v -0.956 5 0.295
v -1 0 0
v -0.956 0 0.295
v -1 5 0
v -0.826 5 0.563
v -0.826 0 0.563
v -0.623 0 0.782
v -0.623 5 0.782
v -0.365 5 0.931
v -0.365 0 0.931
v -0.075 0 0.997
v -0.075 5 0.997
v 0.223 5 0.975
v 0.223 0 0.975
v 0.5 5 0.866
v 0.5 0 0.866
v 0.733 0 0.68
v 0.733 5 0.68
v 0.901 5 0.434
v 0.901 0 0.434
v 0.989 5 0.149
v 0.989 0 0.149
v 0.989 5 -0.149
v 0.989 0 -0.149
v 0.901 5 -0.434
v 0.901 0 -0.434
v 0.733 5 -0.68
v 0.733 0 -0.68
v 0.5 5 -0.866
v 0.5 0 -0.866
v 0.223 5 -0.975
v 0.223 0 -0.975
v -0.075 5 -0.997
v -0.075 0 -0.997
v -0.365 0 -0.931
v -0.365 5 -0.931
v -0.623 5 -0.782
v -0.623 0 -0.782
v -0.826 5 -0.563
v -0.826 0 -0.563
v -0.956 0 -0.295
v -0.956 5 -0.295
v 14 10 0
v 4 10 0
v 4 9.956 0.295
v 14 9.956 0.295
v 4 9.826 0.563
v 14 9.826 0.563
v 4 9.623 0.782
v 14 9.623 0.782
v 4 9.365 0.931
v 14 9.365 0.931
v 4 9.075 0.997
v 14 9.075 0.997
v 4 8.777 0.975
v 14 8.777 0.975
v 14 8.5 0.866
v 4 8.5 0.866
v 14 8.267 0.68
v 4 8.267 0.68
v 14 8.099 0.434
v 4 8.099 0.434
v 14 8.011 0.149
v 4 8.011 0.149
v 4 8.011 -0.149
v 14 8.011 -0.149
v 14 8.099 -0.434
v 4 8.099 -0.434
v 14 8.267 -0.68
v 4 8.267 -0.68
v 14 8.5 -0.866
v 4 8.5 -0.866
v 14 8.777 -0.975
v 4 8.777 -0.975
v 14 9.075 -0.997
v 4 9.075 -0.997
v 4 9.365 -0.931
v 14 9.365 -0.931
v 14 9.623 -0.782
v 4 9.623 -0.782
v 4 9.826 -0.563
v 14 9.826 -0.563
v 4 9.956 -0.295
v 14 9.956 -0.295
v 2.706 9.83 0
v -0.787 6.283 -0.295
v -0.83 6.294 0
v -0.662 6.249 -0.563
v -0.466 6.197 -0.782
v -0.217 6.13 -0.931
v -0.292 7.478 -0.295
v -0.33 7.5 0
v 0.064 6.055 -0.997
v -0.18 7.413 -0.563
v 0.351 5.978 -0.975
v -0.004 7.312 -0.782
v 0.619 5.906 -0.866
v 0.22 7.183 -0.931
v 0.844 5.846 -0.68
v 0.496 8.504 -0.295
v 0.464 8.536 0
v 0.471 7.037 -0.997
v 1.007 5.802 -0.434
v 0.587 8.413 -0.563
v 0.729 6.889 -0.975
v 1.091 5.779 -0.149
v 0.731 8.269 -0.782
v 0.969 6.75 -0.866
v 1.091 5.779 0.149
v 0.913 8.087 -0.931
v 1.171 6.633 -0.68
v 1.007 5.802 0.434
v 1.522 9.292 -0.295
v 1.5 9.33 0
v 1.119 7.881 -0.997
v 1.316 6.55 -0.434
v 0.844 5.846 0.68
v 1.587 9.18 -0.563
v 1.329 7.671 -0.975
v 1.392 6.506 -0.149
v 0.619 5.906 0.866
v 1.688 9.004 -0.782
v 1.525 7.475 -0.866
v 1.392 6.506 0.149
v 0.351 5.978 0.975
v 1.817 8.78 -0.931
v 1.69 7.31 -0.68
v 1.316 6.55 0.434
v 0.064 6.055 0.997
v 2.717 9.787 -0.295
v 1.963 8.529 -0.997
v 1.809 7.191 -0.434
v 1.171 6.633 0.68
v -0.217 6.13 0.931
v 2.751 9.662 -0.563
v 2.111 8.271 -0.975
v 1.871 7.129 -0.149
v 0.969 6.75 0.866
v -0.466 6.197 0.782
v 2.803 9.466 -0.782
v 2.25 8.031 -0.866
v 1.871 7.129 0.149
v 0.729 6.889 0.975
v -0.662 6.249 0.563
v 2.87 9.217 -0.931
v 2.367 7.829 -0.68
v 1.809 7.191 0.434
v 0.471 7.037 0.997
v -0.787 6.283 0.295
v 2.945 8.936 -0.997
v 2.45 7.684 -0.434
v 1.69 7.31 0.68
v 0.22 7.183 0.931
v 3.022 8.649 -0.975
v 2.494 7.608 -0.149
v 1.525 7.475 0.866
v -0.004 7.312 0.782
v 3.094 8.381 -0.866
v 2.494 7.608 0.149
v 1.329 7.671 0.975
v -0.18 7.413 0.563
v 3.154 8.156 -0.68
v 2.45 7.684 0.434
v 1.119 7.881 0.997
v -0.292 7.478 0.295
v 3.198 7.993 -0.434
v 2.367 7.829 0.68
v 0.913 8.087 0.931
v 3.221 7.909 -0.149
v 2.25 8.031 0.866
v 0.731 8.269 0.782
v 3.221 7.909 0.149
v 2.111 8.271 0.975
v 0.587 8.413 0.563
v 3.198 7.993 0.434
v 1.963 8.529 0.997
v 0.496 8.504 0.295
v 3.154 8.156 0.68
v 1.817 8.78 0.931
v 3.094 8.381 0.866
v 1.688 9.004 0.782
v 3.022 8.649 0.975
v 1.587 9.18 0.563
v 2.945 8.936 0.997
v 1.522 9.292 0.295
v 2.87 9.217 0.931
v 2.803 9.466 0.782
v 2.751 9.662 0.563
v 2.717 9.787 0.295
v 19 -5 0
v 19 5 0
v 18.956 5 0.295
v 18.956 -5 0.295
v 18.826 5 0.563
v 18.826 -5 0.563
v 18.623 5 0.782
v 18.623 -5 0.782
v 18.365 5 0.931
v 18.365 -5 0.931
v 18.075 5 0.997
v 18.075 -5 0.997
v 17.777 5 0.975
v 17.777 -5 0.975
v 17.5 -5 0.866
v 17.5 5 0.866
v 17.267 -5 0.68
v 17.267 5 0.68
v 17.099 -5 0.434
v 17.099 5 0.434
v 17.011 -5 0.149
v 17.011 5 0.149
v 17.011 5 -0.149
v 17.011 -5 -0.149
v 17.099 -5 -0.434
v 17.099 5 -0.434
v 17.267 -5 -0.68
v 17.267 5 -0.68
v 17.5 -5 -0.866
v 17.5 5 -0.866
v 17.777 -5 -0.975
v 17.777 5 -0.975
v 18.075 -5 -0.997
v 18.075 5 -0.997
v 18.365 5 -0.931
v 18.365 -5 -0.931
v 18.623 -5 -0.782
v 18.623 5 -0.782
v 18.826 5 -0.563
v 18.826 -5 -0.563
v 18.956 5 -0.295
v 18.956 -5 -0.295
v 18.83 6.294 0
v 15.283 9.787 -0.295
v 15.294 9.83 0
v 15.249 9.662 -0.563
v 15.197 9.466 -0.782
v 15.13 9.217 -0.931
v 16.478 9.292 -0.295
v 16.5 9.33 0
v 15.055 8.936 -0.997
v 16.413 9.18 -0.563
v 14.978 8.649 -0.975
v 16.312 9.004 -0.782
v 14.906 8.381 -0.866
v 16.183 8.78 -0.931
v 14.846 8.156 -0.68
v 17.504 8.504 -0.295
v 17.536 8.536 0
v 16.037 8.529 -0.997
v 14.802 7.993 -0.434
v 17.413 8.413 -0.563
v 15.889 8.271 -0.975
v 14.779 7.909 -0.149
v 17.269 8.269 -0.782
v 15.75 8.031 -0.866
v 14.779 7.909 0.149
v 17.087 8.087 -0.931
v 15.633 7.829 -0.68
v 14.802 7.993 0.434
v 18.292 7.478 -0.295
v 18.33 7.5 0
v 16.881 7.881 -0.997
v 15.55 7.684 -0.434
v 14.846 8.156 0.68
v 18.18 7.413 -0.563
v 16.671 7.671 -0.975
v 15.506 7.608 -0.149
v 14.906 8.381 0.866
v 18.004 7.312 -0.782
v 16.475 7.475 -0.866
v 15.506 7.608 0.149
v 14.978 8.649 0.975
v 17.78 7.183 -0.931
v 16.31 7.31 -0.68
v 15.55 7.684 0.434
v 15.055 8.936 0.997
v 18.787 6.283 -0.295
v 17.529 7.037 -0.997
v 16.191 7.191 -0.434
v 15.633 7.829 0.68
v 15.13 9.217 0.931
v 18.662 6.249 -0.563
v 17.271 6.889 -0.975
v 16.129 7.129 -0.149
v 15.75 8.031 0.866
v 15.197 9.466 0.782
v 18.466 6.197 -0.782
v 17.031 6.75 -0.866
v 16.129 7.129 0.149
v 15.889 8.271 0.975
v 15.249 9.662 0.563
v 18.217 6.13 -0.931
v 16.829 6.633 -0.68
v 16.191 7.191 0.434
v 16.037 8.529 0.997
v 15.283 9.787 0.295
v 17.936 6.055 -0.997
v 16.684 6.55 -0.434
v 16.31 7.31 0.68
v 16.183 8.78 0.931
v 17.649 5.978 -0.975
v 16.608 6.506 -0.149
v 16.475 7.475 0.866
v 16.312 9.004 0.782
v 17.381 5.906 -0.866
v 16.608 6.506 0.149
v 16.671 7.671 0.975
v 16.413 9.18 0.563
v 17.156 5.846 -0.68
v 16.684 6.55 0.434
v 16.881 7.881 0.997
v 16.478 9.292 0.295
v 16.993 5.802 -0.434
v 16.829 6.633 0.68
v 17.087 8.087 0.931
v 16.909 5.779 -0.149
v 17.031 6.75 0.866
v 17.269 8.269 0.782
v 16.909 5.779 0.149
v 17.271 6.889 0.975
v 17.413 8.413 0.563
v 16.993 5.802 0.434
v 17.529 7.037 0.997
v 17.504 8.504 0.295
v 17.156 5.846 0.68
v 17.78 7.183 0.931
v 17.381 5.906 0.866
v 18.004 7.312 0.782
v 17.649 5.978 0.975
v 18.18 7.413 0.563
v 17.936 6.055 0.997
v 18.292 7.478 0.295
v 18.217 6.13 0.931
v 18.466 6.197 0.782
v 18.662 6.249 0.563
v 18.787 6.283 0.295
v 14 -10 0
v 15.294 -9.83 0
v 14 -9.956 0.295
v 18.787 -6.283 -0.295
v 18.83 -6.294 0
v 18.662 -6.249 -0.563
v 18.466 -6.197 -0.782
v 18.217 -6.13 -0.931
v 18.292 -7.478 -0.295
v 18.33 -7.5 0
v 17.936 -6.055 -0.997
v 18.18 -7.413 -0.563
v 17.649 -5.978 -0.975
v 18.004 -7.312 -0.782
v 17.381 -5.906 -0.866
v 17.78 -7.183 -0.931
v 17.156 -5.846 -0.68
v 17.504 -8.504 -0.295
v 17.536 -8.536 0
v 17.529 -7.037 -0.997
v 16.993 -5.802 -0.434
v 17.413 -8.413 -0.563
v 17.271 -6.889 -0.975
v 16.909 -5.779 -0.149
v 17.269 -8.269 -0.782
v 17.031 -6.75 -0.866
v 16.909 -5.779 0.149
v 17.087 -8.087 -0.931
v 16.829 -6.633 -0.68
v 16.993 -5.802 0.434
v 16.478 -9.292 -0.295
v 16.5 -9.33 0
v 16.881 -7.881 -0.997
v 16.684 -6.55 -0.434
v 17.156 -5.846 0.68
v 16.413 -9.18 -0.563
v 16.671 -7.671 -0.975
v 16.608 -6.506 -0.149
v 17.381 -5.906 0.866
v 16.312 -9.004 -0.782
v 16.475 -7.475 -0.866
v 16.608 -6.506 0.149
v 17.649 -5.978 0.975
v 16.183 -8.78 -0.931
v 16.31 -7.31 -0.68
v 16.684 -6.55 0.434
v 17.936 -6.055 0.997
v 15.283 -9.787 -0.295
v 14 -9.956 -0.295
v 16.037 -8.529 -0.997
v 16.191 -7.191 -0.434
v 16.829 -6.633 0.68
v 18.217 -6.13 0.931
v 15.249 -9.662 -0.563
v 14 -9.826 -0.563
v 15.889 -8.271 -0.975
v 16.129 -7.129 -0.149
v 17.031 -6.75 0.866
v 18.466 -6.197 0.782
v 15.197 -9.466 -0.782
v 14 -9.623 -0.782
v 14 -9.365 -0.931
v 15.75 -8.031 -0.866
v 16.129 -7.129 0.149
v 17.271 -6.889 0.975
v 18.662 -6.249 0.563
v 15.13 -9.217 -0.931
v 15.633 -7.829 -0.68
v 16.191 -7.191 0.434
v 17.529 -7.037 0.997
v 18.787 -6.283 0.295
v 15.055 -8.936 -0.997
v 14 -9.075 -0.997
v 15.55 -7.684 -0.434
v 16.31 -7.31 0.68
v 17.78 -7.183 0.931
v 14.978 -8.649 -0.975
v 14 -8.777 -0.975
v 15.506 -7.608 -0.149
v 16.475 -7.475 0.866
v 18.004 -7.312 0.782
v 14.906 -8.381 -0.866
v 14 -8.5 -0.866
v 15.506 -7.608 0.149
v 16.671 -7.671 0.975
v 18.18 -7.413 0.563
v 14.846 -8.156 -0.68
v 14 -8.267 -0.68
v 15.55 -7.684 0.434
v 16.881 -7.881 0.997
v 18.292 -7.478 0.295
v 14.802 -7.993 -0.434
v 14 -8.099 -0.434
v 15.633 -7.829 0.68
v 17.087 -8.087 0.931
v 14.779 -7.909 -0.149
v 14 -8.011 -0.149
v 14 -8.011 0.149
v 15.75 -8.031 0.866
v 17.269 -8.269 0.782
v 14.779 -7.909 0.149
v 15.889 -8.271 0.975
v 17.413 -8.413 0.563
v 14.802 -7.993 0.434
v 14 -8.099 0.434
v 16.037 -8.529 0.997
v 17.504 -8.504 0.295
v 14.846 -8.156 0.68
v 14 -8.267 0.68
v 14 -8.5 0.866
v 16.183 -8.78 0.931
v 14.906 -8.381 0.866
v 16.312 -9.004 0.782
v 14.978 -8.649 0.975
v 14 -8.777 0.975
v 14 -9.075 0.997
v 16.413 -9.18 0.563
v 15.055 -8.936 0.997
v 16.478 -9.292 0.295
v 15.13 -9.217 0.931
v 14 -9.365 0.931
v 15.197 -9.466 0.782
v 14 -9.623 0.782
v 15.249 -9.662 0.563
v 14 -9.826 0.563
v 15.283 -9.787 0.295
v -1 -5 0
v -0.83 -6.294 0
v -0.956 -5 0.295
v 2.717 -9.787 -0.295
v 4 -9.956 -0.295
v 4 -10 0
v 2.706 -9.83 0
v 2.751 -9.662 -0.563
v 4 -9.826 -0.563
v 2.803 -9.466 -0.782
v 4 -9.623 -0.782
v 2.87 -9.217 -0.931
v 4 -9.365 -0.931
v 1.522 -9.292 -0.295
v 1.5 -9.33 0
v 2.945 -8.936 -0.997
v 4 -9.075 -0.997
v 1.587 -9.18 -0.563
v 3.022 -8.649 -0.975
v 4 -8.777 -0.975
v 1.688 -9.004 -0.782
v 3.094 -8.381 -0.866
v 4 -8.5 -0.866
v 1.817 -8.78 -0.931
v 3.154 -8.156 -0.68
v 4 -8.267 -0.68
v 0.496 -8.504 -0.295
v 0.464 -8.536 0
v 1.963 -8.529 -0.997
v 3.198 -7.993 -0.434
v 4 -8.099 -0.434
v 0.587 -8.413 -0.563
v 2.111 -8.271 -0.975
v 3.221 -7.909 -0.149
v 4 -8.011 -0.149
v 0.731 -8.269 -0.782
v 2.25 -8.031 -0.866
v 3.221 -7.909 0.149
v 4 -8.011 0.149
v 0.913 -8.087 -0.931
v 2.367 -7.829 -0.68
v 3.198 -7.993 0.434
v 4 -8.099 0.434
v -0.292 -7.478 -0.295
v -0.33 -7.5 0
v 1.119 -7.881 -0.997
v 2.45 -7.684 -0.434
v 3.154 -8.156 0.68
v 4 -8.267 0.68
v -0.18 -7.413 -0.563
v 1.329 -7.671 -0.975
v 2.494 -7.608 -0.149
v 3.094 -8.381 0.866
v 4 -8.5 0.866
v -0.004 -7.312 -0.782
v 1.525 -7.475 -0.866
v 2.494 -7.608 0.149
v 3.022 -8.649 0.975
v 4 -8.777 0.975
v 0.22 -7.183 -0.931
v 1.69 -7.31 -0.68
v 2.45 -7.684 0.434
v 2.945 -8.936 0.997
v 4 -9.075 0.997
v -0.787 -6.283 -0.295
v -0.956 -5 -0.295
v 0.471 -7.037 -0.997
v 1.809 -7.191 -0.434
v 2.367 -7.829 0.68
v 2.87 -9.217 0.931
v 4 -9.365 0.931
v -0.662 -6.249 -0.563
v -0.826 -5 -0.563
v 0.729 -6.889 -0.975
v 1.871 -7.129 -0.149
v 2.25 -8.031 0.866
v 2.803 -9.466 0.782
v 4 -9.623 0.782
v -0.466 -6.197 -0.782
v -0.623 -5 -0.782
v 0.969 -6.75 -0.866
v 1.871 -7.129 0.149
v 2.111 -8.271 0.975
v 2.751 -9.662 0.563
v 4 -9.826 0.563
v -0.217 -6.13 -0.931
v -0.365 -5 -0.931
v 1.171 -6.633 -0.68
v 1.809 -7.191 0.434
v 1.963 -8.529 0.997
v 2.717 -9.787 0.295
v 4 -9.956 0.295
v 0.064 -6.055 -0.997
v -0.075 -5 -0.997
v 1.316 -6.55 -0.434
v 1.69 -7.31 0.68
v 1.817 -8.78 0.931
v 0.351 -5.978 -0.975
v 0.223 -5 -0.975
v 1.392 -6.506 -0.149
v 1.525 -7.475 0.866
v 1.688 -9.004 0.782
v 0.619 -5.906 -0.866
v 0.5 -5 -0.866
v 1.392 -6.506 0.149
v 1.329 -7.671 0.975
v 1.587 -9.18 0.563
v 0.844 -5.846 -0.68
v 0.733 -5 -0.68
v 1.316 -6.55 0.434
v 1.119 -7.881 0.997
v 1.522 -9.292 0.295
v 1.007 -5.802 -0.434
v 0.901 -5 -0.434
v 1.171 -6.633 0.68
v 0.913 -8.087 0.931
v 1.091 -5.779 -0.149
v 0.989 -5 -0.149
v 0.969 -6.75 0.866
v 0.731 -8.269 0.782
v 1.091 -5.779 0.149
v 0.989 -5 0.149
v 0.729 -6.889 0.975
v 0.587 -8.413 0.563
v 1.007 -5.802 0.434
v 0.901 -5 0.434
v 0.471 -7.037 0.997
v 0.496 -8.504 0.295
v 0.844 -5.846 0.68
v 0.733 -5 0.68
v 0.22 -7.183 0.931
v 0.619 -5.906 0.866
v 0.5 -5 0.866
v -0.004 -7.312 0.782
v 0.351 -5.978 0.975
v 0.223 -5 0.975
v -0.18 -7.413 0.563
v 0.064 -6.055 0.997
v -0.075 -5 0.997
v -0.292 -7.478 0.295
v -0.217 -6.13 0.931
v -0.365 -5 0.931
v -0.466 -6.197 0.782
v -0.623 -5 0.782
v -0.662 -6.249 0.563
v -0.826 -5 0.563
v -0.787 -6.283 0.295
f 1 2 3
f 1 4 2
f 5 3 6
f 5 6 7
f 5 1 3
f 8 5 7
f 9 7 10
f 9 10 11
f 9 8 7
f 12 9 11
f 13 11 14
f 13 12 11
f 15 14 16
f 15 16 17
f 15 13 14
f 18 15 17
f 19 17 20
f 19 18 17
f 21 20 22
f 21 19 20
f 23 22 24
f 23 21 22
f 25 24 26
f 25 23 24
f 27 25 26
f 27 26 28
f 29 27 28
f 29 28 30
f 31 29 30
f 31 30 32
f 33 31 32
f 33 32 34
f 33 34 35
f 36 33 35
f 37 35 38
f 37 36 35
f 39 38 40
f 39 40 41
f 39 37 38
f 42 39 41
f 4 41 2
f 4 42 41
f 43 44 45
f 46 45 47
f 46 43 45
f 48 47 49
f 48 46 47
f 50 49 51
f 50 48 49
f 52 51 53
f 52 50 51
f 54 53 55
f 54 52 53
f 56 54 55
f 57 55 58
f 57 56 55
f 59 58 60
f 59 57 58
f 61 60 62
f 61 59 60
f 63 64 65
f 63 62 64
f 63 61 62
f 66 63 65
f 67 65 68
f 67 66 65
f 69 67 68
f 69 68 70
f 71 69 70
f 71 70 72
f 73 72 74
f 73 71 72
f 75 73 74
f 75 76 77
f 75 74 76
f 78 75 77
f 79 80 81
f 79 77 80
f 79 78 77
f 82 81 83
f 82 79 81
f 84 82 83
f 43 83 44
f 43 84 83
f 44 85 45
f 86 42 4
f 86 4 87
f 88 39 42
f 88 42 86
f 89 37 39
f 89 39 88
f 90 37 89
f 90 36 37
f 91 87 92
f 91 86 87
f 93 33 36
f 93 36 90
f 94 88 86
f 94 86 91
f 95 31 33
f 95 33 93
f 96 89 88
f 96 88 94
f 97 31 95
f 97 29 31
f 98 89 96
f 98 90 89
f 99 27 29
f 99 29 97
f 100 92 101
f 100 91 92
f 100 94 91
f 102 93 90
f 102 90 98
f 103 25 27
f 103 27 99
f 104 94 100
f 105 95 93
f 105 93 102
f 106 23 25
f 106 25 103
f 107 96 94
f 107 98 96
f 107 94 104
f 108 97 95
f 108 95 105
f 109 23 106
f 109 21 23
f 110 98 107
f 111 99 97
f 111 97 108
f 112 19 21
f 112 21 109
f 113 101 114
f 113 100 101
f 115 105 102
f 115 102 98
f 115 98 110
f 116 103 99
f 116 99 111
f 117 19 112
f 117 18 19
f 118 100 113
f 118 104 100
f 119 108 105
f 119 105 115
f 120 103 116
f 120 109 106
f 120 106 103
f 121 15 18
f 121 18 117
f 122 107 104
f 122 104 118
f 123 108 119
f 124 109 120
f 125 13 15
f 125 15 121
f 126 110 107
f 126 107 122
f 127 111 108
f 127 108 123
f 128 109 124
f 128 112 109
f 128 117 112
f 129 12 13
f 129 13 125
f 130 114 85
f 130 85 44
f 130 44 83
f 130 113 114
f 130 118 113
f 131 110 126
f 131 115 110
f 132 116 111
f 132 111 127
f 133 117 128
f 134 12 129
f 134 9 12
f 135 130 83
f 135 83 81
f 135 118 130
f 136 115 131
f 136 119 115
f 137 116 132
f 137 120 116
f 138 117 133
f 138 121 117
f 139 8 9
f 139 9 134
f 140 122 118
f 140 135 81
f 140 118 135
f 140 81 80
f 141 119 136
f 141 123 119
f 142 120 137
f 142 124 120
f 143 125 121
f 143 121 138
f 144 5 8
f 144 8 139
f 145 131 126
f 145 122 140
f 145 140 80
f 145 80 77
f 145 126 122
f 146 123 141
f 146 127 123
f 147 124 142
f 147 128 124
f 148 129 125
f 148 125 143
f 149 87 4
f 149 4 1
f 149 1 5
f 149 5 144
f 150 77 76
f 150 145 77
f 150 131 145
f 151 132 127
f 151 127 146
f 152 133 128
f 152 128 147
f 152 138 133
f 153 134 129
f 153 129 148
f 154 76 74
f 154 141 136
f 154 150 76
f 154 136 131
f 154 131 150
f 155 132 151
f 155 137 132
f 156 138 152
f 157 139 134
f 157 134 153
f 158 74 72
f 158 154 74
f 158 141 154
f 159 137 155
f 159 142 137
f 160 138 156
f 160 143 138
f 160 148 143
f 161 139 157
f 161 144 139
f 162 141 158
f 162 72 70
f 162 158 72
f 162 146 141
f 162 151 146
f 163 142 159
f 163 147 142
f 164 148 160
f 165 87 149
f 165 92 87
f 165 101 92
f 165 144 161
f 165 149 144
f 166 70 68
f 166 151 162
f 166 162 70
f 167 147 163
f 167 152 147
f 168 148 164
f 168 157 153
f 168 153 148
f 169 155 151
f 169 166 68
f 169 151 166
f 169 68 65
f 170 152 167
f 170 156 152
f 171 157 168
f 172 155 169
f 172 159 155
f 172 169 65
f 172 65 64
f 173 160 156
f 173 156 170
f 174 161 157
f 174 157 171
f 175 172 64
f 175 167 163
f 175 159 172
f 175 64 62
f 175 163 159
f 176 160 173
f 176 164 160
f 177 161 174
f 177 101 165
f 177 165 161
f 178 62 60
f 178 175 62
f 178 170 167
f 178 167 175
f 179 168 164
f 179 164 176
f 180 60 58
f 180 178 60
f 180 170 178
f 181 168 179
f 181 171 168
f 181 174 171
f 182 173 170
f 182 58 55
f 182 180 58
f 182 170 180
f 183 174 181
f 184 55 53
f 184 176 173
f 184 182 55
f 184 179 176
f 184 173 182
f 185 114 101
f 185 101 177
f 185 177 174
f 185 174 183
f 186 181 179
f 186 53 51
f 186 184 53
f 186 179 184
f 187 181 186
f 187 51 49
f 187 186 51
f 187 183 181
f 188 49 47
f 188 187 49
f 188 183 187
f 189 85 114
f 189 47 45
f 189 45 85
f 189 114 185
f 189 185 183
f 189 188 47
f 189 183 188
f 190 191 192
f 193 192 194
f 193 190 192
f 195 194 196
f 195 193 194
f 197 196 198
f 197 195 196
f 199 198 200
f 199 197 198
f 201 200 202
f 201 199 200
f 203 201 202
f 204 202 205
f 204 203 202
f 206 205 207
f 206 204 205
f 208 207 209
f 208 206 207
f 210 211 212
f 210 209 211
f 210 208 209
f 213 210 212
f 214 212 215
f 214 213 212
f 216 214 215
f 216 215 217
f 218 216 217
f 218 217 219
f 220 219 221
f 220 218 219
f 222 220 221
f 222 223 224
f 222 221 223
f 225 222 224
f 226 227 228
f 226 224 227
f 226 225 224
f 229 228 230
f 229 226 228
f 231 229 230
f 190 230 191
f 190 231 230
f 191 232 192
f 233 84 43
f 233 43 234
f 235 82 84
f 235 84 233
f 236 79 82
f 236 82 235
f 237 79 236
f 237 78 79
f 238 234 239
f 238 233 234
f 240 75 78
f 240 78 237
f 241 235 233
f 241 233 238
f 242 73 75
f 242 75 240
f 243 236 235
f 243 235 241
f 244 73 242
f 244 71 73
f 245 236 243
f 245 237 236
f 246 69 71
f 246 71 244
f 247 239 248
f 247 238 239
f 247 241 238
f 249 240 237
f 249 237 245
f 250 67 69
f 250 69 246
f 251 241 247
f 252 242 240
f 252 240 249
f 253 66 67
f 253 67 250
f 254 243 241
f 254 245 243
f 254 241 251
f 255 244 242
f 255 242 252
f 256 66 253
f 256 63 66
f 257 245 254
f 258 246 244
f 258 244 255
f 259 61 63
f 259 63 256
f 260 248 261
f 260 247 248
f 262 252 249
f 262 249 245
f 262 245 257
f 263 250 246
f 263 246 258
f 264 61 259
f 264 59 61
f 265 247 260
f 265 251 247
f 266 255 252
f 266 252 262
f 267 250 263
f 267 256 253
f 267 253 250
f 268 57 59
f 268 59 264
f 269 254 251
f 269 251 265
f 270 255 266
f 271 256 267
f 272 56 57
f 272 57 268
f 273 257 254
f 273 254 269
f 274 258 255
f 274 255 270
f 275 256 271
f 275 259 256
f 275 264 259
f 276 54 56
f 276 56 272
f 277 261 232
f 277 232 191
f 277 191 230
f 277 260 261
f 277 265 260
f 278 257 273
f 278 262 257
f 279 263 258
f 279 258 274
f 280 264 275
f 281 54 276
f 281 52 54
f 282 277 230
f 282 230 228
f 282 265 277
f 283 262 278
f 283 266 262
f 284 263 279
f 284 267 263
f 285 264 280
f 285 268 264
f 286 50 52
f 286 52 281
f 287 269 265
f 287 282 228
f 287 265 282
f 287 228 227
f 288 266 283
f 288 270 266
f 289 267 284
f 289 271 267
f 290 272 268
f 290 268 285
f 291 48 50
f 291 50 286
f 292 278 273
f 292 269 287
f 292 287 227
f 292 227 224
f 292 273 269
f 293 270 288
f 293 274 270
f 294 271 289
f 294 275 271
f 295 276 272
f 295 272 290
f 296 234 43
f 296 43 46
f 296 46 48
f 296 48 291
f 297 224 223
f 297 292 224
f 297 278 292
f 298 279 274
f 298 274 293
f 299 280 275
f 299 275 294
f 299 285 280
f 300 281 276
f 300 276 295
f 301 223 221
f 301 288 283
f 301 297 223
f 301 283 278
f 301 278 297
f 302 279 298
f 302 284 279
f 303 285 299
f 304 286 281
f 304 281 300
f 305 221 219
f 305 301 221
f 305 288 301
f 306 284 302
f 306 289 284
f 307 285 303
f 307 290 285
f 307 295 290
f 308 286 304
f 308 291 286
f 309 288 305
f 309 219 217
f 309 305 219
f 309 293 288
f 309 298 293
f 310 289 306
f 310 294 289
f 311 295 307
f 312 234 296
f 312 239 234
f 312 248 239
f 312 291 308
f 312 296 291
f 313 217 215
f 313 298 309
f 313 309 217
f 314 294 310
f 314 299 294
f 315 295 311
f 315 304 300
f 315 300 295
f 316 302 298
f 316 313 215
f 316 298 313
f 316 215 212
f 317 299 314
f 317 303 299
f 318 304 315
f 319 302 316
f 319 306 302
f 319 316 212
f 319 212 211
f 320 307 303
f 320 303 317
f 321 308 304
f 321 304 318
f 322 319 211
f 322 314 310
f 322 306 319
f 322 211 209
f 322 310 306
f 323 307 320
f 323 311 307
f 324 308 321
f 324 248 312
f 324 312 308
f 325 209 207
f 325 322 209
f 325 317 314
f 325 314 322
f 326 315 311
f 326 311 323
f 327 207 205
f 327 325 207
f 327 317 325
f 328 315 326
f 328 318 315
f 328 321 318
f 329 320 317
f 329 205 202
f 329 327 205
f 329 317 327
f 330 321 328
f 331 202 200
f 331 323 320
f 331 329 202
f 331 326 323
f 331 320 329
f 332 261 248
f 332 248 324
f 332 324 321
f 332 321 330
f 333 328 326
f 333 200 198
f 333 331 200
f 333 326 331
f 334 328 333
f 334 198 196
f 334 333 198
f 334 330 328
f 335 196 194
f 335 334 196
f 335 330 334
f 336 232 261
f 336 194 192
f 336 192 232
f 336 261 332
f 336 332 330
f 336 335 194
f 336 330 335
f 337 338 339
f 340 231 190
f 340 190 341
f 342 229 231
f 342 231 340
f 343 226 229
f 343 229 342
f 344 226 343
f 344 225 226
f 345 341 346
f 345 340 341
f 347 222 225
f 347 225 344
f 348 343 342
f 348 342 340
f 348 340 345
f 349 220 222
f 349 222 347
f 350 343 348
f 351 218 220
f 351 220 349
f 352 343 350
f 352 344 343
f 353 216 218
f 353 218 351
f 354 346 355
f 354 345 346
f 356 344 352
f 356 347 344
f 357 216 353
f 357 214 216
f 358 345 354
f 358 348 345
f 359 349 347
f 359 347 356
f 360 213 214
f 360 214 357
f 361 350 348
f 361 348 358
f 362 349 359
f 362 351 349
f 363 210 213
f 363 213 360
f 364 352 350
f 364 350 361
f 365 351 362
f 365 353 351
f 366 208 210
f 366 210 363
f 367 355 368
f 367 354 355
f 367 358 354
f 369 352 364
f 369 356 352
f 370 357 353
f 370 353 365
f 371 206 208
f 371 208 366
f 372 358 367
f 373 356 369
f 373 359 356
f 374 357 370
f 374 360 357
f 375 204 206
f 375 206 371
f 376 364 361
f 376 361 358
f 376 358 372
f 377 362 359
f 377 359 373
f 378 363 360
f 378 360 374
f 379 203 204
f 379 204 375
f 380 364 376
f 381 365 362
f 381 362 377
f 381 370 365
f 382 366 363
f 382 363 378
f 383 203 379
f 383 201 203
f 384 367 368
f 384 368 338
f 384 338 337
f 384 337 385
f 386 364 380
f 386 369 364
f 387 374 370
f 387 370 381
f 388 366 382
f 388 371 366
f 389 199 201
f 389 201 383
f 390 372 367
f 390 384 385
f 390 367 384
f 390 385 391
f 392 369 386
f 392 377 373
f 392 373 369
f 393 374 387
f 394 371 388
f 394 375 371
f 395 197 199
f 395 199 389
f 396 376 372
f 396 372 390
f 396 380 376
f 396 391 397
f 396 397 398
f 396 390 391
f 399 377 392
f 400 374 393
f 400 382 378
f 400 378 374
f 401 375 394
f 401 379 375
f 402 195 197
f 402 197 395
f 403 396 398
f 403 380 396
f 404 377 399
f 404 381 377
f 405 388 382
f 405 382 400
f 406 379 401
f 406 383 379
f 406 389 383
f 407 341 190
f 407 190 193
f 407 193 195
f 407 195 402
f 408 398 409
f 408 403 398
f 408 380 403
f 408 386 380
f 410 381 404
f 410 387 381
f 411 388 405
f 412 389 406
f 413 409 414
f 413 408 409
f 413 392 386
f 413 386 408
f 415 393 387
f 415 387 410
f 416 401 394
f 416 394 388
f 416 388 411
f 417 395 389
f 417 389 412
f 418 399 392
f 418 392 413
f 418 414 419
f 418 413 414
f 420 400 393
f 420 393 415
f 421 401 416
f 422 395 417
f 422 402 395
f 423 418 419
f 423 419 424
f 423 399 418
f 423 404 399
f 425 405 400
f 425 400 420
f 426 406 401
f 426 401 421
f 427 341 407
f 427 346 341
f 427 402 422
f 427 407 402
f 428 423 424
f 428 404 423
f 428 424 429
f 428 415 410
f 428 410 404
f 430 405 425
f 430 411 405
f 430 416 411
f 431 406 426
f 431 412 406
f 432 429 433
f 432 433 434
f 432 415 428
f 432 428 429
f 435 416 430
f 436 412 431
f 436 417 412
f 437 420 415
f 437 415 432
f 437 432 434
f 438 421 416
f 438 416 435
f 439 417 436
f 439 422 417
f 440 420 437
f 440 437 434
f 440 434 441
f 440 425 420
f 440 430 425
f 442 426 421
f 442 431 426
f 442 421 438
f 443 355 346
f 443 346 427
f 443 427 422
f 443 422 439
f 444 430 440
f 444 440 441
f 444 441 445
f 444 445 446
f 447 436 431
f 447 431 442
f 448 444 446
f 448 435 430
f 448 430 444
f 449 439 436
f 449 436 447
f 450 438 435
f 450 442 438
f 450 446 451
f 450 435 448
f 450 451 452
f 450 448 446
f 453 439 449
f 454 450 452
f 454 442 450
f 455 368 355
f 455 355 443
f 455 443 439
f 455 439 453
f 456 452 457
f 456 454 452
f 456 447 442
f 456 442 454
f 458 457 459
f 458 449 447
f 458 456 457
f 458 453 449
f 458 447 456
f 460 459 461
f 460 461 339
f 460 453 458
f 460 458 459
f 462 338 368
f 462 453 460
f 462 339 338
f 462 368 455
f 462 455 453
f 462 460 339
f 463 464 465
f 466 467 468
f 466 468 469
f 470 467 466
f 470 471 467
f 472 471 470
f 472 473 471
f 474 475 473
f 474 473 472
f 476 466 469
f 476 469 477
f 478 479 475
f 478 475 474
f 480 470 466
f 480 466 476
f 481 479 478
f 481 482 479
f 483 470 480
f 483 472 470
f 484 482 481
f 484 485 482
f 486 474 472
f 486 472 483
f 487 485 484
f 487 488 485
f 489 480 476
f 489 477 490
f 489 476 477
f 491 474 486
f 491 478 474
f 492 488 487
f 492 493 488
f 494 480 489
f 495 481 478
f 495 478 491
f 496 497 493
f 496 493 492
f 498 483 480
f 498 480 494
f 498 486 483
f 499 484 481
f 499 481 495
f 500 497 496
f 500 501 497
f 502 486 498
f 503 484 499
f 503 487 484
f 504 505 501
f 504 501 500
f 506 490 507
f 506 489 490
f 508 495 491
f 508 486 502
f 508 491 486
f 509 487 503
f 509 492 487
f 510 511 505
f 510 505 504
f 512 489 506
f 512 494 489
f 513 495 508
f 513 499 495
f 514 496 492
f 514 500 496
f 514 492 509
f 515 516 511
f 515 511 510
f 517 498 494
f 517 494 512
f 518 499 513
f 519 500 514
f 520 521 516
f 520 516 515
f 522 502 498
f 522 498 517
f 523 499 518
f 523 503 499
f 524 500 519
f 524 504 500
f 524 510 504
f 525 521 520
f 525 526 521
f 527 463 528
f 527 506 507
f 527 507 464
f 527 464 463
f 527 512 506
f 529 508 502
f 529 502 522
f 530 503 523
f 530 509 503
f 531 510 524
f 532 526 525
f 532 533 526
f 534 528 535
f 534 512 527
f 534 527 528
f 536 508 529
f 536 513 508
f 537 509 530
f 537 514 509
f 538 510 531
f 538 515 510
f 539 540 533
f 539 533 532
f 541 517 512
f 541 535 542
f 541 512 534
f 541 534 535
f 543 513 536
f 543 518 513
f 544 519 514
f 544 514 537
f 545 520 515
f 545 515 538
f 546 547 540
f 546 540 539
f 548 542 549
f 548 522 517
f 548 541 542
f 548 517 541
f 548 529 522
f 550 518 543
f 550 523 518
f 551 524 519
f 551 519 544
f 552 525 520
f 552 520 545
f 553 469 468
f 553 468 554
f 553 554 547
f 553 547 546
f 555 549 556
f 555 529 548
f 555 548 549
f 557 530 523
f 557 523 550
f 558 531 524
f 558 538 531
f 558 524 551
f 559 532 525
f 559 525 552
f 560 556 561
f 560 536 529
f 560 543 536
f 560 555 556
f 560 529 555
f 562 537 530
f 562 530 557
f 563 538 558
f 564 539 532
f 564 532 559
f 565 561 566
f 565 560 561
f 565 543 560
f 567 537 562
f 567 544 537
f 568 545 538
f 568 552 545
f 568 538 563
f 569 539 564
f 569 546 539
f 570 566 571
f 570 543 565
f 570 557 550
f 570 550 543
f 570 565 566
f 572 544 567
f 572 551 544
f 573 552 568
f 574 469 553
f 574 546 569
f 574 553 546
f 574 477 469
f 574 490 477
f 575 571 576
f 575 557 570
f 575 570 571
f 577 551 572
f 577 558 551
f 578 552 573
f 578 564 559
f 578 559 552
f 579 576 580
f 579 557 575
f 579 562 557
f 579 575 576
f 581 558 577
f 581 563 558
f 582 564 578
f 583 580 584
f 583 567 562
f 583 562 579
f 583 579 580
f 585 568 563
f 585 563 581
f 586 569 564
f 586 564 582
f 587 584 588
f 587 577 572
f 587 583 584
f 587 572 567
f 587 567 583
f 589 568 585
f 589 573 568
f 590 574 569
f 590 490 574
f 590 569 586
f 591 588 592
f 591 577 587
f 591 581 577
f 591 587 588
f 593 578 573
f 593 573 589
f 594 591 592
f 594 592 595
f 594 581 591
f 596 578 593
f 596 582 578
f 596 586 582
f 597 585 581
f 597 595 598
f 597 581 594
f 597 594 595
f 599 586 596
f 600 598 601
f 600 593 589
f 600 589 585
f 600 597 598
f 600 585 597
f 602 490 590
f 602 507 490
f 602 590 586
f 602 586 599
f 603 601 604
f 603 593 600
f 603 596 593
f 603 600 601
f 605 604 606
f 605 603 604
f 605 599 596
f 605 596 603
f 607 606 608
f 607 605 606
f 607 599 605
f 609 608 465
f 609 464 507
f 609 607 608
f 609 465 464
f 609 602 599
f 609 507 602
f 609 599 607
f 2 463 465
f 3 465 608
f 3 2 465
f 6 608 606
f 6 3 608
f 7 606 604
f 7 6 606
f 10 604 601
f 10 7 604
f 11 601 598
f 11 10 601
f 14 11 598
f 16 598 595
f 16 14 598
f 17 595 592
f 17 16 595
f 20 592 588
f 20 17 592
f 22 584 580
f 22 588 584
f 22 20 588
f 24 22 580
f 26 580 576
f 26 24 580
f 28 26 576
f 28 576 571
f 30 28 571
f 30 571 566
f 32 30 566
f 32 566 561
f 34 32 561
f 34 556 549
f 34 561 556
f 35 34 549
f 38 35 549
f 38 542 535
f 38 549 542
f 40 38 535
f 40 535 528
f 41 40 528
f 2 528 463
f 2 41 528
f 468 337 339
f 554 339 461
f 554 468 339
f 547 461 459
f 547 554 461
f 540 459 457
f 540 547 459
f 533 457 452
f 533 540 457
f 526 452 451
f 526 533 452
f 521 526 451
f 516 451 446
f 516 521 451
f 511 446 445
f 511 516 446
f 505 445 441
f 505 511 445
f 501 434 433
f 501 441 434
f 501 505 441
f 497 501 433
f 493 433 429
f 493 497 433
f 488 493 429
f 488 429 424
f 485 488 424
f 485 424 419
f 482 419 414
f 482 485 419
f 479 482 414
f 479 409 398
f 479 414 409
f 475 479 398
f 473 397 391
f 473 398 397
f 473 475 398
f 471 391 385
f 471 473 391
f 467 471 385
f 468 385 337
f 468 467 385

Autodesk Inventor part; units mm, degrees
ref_plane "YZ Plane" through (0, 0, 0) normal (1, 0, 0) x (0, 1, 0)
ref_plane "XZ Plane" through (0, 0, 0) normal (0, 1, 0) x (-1, 0, 0)
ref_plane "XY Plane" through (0, 0, 0) normal (0, 0, 1) x (1, 0, 0)
sketch "Эскиз1" plane through (0, 0, 0) normal (0, 1, 0) x (-1, 0, 0)
  circle A0 centre (0, 0) radius 1
  dimension "d0" = 2
sketch "Эскиз2" plane through (0, 0, 0) normal (0, 0, 1) x (1, 0, 0)
  line L0 (0, 0) -> (0, 5)
  line L1 (4, 9) -> (14, 9)
  line L2 (18, 5) -> (18, -5)
  line L3 (14, -9) -> (4, -9)
  line L4 (0, -5) -> (0, 0)
  arc A0 (4, 9) -> (0, 5) centre (4, 5) ccw
  arc A1 (18, 5) -> (14, 9) centre (14, 5) ccw
  arc A2 (14, -9) -> (18, -5) centre (14, -5) ccw
  arc A3 (0, -5) -> (4, -9) centre (4, -5) ccw
  point P0 (0, 9)
  point P1 (18, 9)
  point P2 (18, -9)
  point P3 (0, -9)
  dimension "d1" = 9
  dimension "d2" = 18
  dimension "d3" = 18
  dimension "d4" = 18
  dimension "d5" = 4
sweep "Сдвиг1" add profiles "Эскиз1" path "Эскиз2"
